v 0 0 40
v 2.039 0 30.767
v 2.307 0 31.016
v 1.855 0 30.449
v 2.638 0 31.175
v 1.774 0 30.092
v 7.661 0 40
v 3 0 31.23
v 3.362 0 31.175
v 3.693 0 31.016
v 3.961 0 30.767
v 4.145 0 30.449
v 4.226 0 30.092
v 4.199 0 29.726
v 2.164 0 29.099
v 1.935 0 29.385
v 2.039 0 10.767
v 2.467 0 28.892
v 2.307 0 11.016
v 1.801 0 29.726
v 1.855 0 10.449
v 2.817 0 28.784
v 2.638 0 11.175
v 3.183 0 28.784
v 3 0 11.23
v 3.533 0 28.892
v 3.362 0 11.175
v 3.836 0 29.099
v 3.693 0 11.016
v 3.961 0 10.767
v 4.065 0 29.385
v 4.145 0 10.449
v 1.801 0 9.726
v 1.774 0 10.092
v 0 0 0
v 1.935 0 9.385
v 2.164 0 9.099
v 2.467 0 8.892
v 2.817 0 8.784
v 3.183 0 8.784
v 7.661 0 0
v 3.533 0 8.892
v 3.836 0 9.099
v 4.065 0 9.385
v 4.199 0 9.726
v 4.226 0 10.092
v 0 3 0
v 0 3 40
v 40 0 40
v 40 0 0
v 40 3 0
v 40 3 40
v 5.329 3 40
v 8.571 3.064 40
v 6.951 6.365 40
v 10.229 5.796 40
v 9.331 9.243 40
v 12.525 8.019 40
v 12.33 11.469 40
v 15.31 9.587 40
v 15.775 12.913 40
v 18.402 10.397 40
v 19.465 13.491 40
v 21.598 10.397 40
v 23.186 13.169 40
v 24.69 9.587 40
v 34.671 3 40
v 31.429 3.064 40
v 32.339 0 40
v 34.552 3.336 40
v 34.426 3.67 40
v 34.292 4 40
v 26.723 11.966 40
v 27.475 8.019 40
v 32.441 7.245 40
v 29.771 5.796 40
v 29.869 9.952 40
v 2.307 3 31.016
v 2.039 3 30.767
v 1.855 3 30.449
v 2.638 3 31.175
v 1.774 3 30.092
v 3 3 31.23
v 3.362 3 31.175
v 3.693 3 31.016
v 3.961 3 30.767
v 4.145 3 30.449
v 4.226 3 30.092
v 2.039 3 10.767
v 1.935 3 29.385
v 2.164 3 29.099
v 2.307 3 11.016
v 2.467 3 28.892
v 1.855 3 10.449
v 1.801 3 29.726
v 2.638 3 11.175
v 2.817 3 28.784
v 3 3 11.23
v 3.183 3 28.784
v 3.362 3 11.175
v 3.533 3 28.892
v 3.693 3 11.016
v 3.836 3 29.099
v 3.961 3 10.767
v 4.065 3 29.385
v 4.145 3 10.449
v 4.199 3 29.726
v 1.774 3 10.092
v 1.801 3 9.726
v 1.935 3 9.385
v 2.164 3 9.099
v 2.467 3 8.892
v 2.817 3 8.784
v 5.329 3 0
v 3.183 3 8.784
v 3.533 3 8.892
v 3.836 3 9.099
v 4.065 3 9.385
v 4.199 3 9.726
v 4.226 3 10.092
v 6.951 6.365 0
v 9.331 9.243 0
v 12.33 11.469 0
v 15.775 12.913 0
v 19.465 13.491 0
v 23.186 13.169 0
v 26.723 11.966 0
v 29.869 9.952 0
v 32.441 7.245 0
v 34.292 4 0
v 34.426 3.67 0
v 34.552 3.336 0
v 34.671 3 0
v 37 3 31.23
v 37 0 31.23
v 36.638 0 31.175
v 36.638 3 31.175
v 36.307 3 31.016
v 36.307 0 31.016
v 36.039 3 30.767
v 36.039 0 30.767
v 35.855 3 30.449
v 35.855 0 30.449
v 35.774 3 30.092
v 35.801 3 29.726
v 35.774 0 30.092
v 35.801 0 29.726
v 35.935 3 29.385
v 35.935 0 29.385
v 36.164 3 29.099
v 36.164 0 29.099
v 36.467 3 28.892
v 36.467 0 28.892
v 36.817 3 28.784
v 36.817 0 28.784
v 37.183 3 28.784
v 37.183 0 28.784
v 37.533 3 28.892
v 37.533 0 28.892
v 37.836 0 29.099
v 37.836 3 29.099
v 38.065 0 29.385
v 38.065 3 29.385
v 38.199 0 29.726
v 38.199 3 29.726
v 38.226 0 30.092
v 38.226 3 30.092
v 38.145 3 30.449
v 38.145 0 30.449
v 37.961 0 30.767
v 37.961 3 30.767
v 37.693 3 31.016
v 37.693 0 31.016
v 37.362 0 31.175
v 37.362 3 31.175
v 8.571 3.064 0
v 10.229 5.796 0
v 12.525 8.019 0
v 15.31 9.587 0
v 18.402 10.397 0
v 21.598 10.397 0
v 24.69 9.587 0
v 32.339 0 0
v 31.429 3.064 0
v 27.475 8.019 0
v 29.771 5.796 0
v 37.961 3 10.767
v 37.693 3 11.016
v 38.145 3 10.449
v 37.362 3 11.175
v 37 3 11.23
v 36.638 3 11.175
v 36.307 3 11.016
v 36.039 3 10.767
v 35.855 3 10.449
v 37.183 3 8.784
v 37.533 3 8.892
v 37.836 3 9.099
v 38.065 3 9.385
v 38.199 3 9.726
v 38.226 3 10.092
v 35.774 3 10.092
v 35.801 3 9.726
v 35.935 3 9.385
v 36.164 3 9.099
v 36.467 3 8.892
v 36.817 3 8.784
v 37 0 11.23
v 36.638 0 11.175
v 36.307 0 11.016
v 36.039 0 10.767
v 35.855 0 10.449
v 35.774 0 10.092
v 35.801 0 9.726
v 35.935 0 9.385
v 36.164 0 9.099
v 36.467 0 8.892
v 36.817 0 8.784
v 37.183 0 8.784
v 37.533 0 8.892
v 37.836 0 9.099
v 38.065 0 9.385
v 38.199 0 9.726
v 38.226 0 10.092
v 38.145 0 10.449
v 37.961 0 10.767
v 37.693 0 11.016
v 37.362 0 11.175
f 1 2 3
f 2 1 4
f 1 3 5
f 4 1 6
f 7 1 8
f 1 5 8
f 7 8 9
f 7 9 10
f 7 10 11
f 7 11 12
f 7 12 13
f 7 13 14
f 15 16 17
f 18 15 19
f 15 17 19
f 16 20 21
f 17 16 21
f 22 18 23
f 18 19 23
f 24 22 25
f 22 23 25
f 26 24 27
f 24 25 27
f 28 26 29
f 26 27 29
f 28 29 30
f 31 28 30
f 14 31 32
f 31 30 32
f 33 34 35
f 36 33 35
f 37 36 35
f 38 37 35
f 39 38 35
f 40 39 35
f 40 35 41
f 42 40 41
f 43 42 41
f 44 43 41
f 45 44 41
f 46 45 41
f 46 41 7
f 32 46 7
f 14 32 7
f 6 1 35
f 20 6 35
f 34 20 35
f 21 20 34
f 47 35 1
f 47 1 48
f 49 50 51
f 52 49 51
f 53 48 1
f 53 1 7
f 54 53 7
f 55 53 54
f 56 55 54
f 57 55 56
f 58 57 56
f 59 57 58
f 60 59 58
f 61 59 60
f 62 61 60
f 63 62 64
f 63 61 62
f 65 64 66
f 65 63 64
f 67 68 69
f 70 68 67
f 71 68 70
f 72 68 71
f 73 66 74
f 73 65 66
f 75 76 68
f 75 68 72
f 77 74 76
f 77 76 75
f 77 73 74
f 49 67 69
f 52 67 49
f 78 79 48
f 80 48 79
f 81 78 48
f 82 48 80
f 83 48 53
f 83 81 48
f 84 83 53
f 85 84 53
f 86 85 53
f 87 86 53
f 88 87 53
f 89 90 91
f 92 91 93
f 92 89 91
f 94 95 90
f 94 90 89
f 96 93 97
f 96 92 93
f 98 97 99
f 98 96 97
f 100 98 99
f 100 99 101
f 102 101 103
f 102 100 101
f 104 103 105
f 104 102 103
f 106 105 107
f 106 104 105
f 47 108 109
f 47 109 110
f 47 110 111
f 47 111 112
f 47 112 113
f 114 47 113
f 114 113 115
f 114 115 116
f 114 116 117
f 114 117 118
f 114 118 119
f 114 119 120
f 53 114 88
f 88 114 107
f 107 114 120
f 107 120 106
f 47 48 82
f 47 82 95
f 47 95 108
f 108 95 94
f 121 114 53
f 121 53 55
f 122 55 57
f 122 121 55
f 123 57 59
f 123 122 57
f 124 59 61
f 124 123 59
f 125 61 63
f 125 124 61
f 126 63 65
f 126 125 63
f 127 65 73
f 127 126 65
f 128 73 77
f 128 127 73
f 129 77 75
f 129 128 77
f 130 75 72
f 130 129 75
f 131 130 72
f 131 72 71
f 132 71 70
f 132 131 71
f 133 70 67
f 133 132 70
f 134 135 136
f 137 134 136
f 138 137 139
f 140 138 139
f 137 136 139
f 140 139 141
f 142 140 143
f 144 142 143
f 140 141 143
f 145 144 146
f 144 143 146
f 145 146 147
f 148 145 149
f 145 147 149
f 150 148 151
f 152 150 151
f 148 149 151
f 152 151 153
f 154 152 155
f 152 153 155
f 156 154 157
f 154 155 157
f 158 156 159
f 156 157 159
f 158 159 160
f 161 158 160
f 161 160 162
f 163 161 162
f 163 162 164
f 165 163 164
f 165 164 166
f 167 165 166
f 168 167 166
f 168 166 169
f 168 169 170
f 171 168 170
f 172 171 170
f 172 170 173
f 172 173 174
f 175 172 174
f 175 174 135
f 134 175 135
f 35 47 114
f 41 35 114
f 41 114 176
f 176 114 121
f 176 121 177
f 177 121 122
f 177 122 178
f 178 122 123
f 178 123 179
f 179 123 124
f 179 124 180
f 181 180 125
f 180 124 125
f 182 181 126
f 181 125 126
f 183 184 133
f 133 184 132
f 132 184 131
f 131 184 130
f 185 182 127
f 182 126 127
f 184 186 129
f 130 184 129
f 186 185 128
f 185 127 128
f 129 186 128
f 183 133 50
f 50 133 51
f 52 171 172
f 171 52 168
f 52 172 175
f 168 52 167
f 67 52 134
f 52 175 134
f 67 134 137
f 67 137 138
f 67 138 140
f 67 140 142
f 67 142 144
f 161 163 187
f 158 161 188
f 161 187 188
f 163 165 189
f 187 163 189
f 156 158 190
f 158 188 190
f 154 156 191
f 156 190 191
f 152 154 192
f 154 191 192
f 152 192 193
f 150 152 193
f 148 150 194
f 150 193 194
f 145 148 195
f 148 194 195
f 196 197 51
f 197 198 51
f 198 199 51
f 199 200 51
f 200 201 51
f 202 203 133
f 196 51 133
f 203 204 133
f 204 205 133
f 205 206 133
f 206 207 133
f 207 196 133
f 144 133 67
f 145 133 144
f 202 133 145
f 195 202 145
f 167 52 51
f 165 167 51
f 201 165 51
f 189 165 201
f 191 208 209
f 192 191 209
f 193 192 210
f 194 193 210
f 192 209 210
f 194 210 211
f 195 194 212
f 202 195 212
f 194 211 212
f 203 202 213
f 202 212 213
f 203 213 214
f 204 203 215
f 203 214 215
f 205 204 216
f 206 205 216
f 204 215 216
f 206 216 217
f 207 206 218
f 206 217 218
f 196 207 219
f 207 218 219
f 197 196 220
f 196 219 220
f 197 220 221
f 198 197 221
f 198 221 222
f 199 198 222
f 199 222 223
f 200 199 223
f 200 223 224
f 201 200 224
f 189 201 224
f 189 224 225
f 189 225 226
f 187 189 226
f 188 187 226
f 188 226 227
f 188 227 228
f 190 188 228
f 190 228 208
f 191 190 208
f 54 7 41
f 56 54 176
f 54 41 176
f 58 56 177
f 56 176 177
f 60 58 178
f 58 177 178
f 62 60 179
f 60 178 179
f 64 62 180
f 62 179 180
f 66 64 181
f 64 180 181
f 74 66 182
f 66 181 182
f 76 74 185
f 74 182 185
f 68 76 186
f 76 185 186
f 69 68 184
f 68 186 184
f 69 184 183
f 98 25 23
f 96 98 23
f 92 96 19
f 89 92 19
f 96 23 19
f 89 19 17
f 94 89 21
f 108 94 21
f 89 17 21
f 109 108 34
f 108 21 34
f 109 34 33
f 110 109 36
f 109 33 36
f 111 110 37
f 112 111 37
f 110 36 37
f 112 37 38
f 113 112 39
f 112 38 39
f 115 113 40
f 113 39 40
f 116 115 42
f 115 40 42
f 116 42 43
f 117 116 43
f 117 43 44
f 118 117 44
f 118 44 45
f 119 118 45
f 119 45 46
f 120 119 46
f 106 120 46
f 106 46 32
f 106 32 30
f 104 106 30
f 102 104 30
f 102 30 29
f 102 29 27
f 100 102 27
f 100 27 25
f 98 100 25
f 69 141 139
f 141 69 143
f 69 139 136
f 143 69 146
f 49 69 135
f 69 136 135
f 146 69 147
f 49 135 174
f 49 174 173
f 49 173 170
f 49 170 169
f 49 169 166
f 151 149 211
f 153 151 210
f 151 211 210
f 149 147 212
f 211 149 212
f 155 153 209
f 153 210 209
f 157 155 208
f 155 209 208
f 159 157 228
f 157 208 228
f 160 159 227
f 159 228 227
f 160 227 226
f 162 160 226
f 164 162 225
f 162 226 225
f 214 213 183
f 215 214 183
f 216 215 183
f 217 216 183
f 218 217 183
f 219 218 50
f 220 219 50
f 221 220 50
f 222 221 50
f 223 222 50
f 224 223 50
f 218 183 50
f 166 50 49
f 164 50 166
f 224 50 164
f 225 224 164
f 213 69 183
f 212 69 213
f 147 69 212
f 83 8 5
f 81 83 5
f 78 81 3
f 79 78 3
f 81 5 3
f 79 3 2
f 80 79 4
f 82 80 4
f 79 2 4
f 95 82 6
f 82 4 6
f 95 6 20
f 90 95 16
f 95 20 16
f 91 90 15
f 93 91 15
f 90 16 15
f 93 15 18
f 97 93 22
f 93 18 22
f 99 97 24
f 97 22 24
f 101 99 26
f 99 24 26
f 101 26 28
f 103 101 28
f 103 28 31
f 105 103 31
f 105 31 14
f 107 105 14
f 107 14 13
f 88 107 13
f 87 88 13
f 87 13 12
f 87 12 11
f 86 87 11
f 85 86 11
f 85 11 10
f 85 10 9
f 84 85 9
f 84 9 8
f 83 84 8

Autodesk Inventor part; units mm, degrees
ref_plane "YZ Plane" through (0, 0, 0) normal (1, 0, 0) x (0, 1, 0)
ref_plane "XZ Plane" through (0, 0, 0) normal (0, 1, 0) x (-1, 0, 0)
ref_plane "XY Plane" through (0, 0, 0) normal (0, 0, 1) x (1, 0, 0)
sketch "Sketch1" plane through (0, 0, 0) normal (0, 0, 1) x (1, 0, 0)
  line L0 (0, 0) -> (0, 3)
  arc A0 (32.339, 0) -> (7.661, 0) centre (20, -2) ccw
  line L1 (0, 0) -> (7.661, 0)
  arc A1 (34.2916, 4) -> (5.3286, 3) centre (20, -2) ccw
  line L2 (0, 3) -> (5.3286, 3)
  line L3 (40, 0) -> (40, 3)
  line L4 (32.339, 0) -> (40, 0)
  line L5 (20, -2) -> (20, 11.991)
  line L6 (40, 0) -> (40, 3)
  line L7 (40, 0) -> (32.339, 0)
  arc A2 (34.6714, 3) -> (5.7084, 4) centre (20, -2) ccw
  line L8 (40, 3) -> (34.6714, 3)
  dimension "d12" = 20
  dimension "d14" = 25
  dimension "d38" = 2
  dimension "d40" = 3
  dimension "d41" = 40
  dimension "d57" = 3
extrude "Extrusion1" add sketch "Sketch1" along normal blind 40
sketch "Sketch3" plane through (0, 3, 0) normal (0, 1, 0) x (1, 0, 0)
  line L0 (5.3286, 0) -> (0, 0) projected
  line L1 (5.3286, -40) -> (0, -40) projected
  line L2 (0, 0) -> (0, -40) projected
  line L3 (40, 0) -> (40, -40) projected
  point P0 (3, -10)
  point P1 (3, -30)
  point P2 (37, -10)
  point P3 (37, -30)
  dimension "d42" = 10
  dimension "d43" = 20
  dimension "d45" = 20
  dimension "d53" = 3
  dimension "d54" = 3
  dimension "d55" = 3
  dimension "d56" = 3
hole "Hole2" at (3, 3, 10) at (3, 3, 30) at (37, 3, 10) at (37, 3, 30) direction (0, -1, 0) diameter 2.459 end through all thread size "M3x0.5" class "6H" standard "ISO Metric profile"
